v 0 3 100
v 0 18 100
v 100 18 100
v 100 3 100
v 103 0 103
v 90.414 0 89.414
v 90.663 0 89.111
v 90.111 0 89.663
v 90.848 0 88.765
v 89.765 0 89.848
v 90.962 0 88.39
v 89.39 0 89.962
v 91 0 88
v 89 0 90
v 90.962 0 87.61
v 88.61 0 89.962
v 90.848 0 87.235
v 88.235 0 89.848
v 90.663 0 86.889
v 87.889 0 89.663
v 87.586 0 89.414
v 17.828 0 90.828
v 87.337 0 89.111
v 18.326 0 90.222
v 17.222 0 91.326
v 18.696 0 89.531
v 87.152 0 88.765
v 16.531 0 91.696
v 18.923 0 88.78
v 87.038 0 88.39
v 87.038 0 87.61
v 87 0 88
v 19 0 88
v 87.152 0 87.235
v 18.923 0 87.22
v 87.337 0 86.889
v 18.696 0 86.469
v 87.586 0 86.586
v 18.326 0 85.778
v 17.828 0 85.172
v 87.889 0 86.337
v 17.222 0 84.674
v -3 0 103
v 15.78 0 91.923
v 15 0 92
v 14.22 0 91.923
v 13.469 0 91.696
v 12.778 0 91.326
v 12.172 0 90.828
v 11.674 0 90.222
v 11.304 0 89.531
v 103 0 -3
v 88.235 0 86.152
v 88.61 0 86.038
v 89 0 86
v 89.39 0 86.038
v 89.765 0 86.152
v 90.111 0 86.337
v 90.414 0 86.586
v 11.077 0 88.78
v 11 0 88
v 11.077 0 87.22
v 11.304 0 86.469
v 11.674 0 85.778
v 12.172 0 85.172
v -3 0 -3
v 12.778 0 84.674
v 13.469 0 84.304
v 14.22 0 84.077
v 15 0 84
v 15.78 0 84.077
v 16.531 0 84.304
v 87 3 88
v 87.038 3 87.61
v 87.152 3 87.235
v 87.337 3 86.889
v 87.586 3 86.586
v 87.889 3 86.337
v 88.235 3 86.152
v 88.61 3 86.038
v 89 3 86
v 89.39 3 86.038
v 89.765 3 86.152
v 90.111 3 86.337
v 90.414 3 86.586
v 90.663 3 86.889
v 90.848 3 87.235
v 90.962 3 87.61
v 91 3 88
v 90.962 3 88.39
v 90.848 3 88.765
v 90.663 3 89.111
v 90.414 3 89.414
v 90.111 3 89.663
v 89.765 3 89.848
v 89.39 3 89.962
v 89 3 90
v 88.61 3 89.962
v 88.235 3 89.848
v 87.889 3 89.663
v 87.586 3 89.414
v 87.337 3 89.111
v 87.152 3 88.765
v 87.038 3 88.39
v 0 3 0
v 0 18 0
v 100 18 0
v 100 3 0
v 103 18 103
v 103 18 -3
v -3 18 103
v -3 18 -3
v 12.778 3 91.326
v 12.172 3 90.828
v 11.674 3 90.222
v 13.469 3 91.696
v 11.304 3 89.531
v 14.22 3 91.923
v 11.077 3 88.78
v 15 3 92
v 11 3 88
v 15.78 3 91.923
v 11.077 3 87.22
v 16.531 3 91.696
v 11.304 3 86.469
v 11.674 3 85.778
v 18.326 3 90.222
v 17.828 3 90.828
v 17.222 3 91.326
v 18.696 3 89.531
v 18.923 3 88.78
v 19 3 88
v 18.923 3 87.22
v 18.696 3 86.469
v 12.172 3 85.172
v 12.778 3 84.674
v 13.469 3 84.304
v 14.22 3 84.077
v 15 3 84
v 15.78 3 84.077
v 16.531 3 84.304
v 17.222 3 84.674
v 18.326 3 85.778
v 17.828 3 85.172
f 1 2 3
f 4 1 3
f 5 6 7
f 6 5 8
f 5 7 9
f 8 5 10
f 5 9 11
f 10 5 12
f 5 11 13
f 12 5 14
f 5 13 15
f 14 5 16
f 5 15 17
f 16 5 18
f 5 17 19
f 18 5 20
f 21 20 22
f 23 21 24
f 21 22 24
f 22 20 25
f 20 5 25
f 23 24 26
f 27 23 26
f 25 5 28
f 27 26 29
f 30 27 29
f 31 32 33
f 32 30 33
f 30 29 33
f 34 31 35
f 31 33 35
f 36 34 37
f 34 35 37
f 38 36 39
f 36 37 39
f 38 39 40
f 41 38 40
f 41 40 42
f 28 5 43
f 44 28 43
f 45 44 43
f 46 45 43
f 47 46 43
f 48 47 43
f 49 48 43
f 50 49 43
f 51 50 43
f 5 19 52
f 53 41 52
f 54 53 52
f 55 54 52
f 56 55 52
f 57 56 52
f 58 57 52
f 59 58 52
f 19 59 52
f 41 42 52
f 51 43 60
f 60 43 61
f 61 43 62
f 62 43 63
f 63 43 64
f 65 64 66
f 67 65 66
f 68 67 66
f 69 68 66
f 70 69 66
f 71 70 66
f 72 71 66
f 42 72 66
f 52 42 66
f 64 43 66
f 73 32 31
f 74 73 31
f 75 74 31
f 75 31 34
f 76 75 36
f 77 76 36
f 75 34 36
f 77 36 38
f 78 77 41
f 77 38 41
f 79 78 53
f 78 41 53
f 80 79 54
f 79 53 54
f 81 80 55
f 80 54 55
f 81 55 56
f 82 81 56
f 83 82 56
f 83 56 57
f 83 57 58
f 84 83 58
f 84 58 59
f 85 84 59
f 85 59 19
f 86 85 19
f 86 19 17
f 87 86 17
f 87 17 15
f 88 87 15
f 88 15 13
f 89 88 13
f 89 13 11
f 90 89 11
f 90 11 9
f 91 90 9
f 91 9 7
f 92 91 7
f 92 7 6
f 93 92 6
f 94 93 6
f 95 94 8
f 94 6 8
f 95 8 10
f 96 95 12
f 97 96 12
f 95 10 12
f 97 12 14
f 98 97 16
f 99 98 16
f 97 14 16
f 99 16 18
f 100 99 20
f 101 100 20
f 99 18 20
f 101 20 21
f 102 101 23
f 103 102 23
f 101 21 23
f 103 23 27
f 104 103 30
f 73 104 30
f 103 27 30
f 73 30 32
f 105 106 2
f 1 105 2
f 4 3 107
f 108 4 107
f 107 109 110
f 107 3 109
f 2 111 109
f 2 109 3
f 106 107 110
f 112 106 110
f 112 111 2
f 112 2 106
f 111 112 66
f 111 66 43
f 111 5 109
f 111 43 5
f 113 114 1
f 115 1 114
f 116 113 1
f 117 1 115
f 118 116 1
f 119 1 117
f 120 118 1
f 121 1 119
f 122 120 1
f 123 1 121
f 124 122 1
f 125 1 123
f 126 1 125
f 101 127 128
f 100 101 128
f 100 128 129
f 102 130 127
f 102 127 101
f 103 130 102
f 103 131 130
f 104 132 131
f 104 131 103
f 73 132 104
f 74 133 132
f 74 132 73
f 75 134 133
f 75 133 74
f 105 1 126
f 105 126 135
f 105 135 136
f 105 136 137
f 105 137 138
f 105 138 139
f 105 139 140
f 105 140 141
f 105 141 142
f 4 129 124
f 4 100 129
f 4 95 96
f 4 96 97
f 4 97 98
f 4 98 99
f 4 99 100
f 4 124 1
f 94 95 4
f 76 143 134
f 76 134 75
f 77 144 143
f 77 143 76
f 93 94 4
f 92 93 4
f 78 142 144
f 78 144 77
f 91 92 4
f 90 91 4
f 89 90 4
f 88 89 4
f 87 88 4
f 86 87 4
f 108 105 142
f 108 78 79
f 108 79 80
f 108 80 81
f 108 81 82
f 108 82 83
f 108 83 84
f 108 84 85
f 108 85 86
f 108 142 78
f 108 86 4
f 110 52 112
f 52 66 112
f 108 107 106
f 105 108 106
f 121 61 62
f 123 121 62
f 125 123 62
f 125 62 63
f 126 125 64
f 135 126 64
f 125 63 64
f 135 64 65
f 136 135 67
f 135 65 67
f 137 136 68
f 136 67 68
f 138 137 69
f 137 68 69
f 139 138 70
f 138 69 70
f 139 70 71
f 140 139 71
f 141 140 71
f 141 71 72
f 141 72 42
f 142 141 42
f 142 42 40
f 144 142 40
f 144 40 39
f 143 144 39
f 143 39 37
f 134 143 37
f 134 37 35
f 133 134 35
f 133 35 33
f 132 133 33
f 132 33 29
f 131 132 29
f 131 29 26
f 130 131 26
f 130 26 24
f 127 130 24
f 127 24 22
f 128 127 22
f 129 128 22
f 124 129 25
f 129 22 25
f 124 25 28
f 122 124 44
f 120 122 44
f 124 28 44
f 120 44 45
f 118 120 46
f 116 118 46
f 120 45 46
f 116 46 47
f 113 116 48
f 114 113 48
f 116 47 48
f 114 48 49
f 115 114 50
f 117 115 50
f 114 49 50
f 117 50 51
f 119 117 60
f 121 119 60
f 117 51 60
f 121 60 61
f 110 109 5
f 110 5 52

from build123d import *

# Parameters (mm, degrees)
SKETCH3_W             = 100
SKETCH3_H             = 100
BOSS_EXTRUDE1_DEPTH   = 3
SKETCH5_W             = 100
SKETCH5_H             = 18
BOSS_EXTRUDE2_DEPTH   = 3
SKETCH6_W             = 100
SKETCH6_H             = 18
BOSS_EXTRUDE3_DEPTH   = 3
SKETCH7_W             = 106
SKETCH7_H             = 18
BOSS_EXTRUDE4_DEPTH   = 3
SKETCH9_W             = 106
SKETCH9_H             = 18
BOSS_EXTRUDE5_DEPTH   = 3
F_8_0MM_DOWEL_HOLE1_D = 8
F_4_0MM_DOWEL_HOLE1_D = 4


with BuildPart() as part:
    # Sketch3 → Boss-Extrude1 (new body)
    with BuildSketch(Plane(origin=(0, 0, 0), x_dir=(1, 0, 0), z_dir=(0, 1, 0))):
        with Locations((50, -50)):
            Rectangle(SKETCH3_W, SKETCH3_H)
    extrude(amount=BOSS_EXTRUDE1_DEPTH)

    # Sketch5 → Boss-Extrude2 (add)
    with BuildSketch(Plane.XY.offset(100)):
        with Locations((50, 9)):
            Rectangle(SKETCH5_W, SKETCH5_H)
    extrude(amount=BOSS_EXTRUDE2_DEPTH)

    # Sketch6 → Boss-Extrude3 (add)
    with BuildSketch(Plane(origin=(0, 0, 0), x_dir=(-1, 0, 0), z_dir=(0, 0, -1))):
        with Locations((-50, 9)):
            Rectangle(SKETCH6_W, SKETCH6_H)
    extrude(amount=BOSS_EXTRUDE3_DEPTH)

    # Sketch7 → Boss-Extrude4 (add)
    with BuildSketch(Plane.ZY):
        with Locations((50, 9)):
            Rectangle(SKETCH7_W, SKETCH7_H)
    extrude(amount=BOSS_EXTRUDE4_DEPTH)

    # Sketch9 → Boss-Extrude5 (add)
    with BuildSketch(Plane(origin=(100, 0, 0), x_dir=(0, 0, -1), z_dir=(1, 0, 0))):
        with Locations((-50, 9)):
            Rectangle(SKETCH9_W, SKETCH9_H)
    extrude(amount=BOSS_EXTRUDE5_DEPTH)

    # Ø8.0mm Dowel Hole1 (through all)
    with Locations(Plane(origin=(0, 3, 0), x_dir=(1, 0, 0), z_dir=(0, 1, 0))):
        with Locations((15, -88)):
            Hole(F_8_0MM_DOWEL_HOLE1_D / 2)

    # Ø4.0mm Dowel Hole1 (through all)
    with Locations(Plane(origin=(0, 3, 0), x_dir=(1, 0, 0), z_dir=(0, 1, 0))):
        with Locations((89, -88)):
            Hole(F_4_0MM_DOWEL_HOLE1_D / 2)


solid = part.part
